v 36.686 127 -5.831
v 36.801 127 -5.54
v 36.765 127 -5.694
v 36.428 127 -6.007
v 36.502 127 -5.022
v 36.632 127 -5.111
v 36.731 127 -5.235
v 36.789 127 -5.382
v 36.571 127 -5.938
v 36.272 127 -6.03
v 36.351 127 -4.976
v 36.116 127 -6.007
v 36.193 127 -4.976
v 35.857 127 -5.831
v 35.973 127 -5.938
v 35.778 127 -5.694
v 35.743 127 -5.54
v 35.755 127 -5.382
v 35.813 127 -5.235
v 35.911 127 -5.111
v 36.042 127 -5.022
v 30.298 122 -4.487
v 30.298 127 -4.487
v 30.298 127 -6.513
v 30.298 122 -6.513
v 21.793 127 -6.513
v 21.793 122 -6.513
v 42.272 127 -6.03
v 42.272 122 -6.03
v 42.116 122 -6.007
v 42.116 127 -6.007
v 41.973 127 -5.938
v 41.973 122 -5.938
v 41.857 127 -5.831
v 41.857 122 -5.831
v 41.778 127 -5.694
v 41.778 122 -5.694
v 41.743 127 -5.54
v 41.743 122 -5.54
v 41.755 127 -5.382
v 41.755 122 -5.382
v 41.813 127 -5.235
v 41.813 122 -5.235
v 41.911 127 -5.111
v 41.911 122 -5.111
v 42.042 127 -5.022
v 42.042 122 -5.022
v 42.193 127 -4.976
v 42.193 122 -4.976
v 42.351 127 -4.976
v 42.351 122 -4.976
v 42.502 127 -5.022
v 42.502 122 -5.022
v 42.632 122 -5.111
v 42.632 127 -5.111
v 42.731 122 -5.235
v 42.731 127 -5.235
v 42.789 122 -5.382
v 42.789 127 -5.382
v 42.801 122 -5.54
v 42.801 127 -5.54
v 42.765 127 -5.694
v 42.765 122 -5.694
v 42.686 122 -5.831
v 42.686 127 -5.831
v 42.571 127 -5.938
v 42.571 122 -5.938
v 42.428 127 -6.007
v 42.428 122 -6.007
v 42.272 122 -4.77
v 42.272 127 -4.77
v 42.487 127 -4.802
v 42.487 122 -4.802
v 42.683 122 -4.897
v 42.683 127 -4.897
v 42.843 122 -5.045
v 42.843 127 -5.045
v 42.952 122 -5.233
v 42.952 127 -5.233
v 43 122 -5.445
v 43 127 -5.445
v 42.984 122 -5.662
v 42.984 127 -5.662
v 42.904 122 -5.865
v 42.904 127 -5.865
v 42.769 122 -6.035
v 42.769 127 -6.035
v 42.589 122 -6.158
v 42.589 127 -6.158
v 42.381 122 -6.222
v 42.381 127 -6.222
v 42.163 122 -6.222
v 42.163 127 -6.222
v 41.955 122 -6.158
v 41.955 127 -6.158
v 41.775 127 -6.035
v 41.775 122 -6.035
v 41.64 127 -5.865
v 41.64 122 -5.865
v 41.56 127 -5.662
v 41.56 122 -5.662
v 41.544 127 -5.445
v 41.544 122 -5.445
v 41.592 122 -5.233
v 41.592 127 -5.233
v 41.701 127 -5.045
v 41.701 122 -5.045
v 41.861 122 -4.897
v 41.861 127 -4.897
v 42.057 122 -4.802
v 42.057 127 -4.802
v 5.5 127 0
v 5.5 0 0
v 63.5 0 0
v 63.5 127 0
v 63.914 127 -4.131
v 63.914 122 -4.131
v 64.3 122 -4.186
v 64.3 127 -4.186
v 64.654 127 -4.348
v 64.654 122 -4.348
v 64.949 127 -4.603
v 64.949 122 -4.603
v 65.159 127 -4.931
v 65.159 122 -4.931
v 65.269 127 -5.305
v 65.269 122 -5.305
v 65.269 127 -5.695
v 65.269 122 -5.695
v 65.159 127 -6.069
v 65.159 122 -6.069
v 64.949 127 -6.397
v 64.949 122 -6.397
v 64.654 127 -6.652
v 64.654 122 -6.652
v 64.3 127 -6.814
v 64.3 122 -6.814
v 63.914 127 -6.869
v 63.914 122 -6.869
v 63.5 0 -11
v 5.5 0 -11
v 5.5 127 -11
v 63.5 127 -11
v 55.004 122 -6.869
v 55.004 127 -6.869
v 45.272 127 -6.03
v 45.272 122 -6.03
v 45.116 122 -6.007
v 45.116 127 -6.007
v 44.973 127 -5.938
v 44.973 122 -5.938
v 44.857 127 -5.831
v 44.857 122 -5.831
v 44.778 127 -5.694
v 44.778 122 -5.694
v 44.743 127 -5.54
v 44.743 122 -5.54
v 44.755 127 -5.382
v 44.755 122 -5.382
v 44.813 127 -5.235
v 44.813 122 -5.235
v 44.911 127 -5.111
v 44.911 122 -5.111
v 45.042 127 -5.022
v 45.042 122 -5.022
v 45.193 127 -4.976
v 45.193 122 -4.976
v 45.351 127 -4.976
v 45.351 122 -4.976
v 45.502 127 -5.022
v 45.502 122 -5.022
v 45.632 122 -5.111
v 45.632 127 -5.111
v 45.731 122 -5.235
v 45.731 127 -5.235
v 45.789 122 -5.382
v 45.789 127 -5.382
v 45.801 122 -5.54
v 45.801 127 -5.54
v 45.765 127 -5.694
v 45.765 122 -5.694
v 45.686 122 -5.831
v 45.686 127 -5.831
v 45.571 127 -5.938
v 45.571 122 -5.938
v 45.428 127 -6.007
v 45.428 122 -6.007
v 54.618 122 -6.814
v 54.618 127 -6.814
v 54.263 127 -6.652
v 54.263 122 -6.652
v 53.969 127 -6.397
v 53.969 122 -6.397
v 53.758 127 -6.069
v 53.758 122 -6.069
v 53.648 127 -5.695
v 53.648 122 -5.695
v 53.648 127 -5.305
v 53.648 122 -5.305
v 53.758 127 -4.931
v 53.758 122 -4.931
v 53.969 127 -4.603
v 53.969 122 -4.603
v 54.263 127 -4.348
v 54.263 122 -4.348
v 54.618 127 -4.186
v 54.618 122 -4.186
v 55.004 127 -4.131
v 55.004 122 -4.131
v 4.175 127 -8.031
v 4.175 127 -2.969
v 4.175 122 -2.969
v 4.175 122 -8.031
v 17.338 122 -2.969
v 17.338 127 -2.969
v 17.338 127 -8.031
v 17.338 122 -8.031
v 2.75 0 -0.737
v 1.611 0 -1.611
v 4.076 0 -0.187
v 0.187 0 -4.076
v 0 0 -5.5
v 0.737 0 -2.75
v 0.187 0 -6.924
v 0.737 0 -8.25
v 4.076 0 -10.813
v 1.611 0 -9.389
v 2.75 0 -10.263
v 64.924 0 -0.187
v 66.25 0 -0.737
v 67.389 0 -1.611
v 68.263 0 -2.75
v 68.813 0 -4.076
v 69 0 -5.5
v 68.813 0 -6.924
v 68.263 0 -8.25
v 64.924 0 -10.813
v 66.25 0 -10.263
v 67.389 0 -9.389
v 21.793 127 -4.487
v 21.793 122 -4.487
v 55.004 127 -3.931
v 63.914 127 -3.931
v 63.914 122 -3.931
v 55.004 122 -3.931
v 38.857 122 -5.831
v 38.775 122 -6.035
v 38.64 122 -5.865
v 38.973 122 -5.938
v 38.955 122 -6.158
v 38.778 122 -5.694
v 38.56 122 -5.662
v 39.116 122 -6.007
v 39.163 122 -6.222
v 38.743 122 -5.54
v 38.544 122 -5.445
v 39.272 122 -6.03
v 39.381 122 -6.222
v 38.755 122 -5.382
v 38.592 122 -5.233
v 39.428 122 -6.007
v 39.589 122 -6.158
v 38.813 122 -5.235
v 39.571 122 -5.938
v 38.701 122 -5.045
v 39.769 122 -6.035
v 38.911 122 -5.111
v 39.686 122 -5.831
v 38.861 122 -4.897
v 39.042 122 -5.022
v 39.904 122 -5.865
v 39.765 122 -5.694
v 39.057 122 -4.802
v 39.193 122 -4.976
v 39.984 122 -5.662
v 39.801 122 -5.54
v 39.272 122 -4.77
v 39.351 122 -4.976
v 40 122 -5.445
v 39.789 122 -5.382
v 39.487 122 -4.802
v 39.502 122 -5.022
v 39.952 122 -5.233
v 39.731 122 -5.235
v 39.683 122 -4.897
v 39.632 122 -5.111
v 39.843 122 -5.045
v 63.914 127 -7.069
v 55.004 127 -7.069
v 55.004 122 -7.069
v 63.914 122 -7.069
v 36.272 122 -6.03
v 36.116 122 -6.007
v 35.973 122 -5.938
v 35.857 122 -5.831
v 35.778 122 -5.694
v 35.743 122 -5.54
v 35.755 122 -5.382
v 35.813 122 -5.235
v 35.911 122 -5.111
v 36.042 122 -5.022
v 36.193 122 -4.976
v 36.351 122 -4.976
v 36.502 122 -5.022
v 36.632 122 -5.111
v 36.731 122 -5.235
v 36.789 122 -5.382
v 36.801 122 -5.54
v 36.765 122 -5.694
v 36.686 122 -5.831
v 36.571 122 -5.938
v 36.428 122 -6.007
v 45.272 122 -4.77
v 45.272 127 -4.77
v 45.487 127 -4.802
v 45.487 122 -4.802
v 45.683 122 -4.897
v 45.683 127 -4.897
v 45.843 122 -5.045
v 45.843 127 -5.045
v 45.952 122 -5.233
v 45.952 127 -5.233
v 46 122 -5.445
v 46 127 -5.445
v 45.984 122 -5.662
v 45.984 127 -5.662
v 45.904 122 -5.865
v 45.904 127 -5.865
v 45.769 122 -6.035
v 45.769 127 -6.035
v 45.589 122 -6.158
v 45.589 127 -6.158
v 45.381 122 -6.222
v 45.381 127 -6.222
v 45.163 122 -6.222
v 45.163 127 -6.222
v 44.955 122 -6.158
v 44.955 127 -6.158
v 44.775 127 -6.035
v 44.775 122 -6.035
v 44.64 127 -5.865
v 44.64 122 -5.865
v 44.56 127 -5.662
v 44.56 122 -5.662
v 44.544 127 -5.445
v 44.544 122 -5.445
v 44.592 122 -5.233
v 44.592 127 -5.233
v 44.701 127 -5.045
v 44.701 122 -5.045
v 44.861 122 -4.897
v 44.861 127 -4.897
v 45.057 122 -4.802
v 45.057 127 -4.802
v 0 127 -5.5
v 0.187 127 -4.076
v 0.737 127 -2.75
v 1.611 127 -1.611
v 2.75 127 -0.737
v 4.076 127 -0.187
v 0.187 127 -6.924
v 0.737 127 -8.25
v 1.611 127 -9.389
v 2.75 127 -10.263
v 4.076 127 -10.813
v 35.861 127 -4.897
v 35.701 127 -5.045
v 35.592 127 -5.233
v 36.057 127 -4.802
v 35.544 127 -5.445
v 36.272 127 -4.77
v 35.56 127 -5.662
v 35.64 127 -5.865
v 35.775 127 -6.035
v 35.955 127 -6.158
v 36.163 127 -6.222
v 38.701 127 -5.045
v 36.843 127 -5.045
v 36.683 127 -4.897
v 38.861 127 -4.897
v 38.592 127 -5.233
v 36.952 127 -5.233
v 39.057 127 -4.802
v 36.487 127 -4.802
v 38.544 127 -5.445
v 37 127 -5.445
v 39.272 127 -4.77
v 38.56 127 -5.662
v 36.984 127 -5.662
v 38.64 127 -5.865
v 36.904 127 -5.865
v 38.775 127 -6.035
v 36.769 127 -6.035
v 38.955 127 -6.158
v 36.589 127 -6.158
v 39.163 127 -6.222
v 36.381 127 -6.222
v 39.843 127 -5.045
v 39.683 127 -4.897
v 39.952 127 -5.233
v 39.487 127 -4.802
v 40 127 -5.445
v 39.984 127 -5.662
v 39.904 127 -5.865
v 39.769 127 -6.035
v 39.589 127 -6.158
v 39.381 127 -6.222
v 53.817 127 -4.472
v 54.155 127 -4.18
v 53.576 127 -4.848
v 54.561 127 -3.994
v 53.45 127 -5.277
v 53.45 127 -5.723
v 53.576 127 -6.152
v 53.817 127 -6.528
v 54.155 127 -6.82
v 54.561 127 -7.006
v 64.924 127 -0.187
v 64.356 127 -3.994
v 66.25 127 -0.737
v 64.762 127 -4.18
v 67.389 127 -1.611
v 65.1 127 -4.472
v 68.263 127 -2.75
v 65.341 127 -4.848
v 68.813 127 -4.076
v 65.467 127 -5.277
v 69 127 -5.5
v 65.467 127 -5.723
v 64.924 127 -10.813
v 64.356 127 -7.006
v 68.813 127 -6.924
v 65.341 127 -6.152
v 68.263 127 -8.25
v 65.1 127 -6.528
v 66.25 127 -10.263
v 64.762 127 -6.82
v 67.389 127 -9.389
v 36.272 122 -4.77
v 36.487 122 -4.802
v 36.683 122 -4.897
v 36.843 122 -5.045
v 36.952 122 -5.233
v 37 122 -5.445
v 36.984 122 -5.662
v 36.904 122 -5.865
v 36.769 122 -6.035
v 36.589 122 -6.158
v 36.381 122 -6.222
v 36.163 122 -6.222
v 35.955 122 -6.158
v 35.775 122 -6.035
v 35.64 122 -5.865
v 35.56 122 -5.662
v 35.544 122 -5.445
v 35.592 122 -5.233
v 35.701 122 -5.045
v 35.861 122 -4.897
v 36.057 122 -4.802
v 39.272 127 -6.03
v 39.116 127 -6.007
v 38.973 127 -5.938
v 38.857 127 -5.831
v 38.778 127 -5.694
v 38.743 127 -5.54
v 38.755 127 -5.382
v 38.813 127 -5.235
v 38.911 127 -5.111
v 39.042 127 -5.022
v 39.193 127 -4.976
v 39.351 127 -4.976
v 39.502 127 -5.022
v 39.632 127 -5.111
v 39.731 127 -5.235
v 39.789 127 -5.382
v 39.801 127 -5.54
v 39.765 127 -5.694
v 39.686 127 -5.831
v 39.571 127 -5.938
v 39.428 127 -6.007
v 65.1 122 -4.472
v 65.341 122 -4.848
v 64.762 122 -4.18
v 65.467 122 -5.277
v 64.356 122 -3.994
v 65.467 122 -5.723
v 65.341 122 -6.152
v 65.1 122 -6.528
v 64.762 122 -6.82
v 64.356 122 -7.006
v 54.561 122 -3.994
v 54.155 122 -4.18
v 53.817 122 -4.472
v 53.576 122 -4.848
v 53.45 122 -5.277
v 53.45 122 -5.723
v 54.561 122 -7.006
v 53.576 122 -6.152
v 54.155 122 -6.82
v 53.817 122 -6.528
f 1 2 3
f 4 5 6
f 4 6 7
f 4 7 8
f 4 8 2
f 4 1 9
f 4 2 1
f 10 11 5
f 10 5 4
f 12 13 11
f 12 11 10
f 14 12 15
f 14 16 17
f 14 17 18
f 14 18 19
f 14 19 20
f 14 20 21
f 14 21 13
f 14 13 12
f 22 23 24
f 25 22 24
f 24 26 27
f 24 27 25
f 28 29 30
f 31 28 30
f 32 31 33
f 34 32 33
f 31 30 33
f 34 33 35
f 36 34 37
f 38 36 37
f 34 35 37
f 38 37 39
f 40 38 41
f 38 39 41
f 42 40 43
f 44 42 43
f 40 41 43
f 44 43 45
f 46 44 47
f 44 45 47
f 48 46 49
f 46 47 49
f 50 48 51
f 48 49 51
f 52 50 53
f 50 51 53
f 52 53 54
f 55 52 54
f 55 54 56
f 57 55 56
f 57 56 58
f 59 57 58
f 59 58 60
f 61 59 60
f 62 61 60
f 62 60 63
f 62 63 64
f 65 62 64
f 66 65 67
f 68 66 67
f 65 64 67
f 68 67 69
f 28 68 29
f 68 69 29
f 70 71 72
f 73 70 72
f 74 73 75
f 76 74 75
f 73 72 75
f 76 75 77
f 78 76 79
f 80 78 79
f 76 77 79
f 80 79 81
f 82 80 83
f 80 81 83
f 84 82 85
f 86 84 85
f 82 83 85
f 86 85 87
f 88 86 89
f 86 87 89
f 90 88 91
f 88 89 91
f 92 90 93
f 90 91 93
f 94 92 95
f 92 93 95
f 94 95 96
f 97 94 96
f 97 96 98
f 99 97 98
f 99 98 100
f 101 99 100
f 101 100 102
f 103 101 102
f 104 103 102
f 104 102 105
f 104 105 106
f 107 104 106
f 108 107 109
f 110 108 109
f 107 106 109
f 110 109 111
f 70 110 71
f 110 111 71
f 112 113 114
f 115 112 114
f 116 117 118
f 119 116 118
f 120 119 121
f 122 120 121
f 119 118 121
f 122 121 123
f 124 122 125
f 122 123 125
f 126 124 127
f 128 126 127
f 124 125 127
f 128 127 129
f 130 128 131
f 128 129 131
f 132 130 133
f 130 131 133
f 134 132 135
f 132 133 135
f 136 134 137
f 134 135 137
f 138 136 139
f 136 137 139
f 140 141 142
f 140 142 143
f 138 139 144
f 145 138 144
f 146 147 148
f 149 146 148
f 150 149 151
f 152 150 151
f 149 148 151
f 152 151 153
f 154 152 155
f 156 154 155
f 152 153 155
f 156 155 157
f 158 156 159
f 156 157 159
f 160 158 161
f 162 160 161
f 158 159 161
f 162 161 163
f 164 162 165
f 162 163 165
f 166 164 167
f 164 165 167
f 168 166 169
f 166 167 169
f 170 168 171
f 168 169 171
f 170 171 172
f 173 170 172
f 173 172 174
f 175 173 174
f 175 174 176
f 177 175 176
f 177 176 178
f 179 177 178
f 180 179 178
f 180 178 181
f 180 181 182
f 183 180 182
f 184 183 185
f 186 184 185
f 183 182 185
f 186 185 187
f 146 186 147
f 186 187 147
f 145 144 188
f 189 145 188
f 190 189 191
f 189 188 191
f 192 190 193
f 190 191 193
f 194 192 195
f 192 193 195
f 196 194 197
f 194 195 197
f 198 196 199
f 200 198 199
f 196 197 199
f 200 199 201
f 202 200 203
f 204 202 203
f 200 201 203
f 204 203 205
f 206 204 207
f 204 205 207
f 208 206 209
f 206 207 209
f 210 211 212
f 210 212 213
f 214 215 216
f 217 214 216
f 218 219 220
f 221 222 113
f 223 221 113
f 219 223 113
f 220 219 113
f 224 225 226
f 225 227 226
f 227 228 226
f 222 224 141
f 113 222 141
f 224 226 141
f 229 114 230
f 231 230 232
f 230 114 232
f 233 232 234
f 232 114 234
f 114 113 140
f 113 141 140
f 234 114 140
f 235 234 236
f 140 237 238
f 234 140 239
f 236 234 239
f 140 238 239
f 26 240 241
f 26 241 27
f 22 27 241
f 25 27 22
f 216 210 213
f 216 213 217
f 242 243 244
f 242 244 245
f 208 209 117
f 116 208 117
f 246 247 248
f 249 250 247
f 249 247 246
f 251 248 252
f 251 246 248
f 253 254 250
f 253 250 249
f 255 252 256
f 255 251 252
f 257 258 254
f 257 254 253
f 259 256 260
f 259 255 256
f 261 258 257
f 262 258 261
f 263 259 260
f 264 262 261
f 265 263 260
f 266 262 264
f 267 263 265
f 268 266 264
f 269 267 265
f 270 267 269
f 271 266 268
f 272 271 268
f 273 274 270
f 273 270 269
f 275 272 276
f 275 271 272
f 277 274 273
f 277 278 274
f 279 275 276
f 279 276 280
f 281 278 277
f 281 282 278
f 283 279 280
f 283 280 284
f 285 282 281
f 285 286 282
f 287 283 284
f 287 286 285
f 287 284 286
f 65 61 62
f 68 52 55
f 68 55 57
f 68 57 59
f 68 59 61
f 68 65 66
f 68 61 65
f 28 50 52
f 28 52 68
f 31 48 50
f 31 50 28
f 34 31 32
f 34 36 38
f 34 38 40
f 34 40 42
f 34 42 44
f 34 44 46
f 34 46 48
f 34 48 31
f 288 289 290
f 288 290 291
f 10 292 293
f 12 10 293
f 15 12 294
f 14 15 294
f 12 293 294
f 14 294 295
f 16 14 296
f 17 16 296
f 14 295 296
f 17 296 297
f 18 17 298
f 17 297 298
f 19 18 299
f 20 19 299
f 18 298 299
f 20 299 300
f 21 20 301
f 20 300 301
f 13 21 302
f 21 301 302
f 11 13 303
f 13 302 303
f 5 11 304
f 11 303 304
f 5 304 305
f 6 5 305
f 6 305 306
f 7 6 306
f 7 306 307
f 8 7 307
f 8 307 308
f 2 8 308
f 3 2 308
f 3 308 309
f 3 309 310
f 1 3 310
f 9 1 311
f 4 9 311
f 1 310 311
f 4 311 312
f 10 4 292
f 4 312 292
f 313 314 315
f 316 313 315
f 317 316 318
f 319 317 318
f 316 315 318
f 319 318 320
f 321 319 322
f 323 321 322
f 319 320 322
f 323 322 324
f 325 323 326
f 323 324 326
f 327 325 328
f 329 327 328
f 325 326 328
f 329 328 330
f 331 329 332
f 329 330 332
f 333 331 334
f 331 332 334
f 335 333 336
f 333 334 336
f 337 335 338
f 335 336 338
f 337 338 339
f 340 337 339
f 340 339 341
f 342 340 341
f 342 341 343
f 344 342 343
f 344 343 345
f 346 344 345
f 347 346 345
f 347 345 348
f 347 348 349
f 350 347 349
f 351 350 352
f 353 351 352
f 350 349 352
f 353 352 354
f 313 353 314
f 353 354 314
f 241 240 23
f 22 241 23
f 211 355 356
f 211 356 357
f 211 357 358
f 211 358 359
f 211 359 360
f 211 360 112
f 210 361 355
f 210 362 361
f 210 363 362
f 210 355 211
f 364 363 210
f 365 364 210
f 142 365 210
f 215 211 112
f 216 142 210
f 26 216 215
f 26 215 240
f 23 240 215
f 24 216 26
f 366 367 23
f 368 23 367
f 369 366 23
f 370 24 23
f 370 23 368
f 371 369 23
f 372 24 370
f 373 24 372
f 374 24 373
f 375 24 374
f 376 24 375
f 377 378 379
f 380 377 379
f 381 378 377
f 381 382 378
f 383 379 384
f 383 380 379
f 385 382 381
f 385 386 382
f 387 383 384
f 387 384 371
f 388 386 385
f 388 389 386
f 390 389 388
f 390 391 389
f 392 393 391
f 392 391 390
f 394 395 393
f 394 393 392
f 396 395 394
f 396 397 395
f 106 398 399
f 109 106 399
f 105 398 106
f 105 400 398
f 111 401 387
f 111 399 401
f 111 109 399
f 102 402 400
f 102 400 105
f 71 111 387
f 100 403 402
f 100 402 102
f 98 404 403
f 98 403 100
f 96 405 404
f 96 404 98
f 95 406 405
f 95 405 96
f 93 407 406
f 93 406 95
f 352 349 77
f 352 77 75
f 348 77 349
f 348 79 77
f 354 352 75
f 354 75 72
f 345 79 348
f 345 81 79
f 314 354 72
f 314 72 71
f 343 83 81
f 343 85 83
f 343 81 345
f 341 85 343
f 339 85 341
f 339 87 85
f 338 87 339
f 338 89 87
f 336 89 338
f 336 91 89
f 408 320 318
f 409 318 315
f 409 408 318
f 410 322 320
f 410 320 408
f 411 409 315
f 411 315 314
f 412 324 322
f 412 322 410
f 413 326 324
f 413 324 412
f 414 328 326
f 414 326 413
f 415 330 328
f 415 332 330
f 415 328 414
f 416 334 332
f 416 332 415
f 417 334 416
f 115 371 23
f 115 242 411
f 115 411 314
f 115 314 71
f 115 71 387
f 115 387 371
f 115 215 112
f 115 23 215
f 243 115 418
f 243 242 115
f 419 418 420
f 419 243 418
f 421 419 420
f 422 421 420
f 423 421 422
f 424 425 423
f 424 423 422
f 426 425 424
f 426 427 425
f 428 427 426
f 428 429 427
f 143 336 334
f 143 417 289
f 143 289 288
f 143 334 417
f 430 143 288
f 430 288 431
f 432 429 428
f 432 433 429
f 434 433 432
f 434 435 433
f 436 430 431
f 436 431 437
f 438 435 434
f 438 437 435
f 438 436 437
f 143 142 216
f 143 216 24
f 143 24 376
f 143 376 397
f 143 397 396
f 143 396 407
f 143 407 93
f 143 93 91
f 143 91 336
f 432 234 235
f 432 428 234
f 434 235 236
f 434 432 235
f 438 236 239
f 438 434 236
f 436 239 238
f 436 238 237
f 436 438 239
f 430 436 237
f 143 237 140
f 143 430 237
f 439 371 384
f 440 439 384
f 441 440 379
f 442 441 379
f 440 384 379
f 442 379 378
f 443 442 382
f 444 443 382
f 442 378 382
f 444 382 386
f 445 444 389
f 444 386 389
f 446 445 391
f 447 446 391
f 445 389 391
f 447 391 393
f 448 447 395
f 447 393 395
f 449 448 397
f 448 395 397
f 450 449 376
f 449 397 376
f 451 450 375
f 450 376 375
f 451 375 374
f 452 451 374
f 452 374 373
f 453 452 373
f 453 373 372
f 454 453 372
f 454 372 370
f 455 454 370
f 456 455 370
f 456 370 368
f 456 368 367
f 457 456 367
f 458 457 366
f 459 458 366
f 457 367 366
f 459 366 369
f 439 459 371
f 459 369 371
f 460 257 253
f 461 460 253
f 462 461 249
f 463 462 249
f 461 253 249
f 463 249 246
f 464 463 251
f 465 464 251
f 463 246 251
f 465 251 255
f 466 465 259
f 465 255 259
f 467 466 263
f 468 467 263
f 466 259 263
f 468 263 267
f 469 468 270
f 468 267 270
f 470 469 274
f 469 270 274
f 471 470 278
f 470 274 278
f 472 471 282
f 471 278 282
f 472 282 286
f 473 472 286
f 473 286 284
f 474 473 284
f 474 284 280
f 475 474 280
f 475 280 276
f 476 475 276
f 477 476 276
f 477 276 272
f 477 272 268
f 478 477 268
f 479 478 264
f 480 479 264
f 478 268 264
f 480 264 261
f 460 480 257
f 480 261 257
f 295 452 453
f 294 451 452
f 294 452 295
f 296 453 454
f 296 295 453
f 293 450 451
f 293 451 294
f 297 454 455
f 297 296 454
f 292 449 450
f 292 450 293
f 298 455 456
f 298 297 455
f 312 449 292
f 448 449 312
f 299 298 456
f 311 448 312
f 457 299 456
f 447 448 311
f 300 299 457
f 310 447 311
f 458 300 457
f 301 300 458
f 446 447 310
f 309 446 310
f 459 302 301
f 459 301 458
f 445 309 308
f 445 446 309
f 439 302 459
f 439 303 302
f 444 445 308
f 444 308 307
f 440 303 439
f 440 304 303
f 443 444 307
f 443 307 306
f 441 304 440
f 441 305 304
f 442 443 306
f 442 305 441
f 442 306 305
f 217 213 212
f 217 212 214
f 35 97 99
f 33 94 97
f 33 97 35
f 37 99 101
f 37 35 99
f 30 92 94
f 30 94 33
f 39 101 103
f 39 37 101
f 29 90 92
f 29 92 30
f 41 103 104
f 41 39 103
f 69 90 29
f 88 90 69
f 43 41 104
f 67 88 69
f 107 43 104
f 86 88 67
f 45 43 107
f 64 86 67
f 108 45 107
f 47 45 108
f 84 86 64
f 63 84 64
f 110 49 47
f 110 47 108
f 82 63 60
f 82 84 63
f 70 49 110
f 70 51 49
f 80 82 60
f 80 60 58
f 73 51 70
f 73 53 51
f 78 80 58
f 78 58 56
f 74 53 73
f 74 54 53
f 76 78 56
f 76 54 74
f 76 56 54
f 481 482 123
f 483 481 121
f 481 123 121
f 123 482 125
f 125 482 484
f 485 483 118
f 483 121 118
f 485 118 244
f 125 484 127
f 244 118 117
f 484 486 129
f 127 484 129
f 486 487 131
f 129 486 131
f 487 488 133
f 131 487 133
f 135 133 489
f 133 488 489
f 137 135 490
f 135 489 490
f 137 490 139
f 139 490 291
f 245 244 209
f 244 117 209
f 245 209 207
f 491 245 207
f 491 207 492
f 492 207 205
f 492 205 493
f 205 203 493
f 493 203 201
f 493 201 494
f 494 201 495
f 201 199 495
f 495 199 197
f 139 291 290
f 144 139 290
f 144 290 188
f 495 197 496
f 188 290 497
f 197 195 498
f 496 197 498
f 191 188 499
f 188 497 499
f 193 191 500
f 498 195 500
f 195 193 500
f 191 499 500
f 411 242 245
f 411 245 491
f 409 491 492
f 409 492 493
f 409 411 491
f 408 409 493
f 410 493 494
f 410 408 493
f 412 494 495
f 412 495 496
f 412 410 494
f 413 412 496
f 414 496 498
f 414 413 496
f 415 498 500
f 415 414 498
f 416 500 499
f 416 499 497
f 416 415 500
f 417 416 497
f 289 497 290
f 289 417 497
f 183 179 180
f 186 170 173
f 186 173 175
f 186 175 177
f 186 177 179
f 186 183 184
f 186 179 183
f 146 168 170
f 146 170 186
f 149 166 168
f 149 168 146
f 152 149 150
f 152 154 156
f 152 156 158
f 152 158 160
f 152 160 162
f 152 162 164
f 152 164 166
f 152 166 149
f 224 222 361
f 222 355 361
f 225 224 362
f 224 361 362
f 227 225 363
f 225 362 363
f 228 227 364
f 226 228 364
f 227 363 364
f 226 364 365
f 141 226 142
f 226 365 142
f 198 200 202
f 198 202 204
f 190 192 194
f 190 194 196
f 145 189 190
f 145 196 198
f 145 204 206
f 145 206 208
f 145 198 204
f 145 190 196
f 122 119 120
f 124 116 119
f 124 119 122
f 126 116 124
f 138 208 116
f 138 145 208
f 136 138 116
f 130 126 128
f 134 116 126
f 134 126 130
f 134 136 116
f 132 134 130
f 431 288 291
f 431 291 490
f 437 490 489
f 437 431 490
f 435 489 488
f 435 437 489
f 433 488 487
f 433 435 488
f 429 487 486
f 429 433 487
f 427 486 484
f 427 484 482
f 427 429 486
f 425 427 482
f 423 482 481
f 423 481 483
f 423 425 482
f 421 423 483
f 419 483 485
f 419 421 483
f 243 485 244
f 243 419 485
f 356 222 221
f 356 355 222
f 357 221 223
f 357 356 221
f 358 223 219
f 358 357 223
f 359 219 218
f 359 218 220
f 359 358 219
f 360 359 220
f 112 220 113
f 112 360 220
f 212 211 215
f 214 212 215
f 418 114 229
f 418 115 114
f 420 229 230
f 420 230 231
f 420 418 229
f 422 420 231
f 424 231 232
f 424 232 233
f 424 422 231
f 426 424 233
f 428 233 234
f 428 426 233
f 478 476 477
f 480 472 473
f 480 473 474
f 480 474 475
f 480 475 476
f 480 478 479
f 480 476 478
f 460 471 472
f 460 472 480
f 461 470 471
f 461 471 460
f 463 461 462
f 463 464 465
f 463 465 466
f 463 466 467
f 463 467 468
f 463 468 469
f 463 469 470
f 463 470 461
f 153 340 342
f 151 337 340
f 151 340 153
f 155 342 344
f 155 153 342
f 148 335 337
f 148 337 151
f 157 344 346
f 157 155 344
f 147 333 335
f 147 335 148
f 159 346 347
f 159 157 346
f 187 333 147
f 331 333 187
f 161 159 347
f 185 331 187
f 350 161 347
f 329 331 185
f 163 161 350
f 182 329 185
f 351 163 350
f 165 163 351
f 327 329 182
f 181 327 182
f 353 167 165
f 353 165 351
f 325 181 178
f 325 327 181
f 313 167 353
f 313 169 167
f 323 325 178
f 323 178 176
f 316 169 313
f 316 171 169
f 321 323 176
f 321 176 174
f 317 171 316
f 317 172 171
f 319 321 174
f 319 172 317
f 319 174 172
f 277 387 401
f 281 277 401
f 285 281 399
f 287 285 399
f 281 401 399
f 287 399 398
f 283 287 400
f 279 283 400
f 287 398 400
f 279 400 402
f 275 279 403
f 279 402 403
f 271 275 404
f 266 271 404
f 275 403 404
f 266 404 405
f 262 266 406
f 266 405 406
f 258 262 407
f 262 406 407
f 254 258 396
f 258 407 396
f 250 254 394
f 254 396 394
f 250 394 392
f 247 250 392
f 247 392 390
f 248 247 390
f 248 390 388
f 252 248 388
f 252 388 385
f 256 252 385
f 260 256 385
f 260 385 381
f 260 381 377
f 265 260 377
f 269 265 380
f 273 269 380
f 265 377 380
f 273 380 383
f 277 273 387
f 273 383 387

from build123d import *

# Parameters (mm, degrees)
SKETCH1_W           = 69
SKETCH1_H           = 11
BOSS_EXTRUDE1_DEPTH = 127
FILLET1_R           = 5.5
SKETCH2_R           = 0.730138729
SKETCH2_W           = 13.16276312
SKETCH2_H           = 5.0626012
SKETCH2_W_2         = 8.505170017
SKETCH2_H_2         = 2.02504048
CUT_EXTRUDE1_DEPTH  = 5
SKETCH3_R           = 0.530138729
BOSS_EXTRUDE2_DEPTH = 5


with BuildPart() as part:
    # Sketch1 → Boss-Extrude1 (new body)
    with BuildSketch(Plane(origin=(0, 0, 0), x_dir=(1, 0, 0), z_dir=(0, 1, 0))):
        with Locations((34.5, 5.5)):
            Rectangle(SKETCH1_W, SKETCH1_H)
    extrude(amount=BOSS_EXTRUDE1_DEPTH)

    # Fillet1
    fillet1_edges = [part.edges().sort_by_distance(p)[0] for p in [
        (69, 63.5, 0),
        (69, 63.5, -11),
        (0, 63.5, -11),
        (0, 63.5, 0),
    ]]
    fillet(fillet1_edges, radius=FILLET1_R - 0.0001)  # a hair under: the kernel refuses the full size

    # Sketch2 → Cut-Extrude1 (cut)
    with BuildSketch(Plane(origin=(0, 127, 0), x_dir=(1, 0, 0), z_dir=(0, 1, 0))):
        with Locations(Location((36.27191042, 5.5, 0), (0, 0, 270))):
            Circle(SKETCH2_R)
        with Locations(Location((39.27191042, 5.5, 0), (0, 0, 270))):
            Circle(SKETCH2_R)
        with Locations(Location((42.27191042, 5.5, 0), (0, 0, 270))):
            Circle(SKETCH2_R)
        with Locations(Location((45.27191042, 5.5, 0), (0, 0, 270))):
            Circle(SKETCH2_R)
        with Locations((10.756400371, 5.5)):
            Rectangle(SKETCH2_W, SKETCH2_H)
        with Locations((26.045455995, 5.5)):
            Rectangle(SKETCH2_W_2, SKETCH2_H_2)
        with BuildLine():
            Line((55.003534861, 7.069406372), (63.913712973, 7.069406372))
            ThreePointArc((63.913712973, 7.069406372), (65.483119345, 5.5), (63.913712973, 3.930593628))
            Line((63.913712973, 3.930593628), (55.003534861, 3.930593628))
            ThreePointArc((55.003534861, 3.930593628), (53.434128489, 5.5), (55.003534861, 7.069406372))
        make_face()
    extrude(amount=-CUT_EXTRUDE1_DEPTH, mode=Mode.SUBTRACT)

    # Sketch3 → Boss-Extrude2 (add)
    with BuildSketch(Plane(origin=(0, 122, 0), x_dir=(1, 0, 0), z_dir=(0, 1, 0))):
        with Locations(Location((36.27191042, 5.5, 0), (0, 0, 90))):
            Circle(SKETCH3_R)
        with Locations(Location((39.27191042, 5.5, 0), (0, 0, 90))):
            Circle(SKETCH3_R)
        with Locations(Location((42.27191042, 5.5, 0), (0, 0, 90))):
            Circle(SKETCH3_R)
        with Locations(Location((45.27191042, 5.5, 0), (0, 0, 90))):
            Circle(SKETCH3_R)
        with BuildLine():
            Line((55.003534861, 4.130593628), (63.913712973, 4.130593628))
            ThreePointArc((63.913712973, 4.130593628), (65.283119345, 5.5), (63.913712973, 6.869406372))
            Line((63.913712973, 6.869406372), (55.003534861, 6.869406372))
            ThreePointArc((55.003534861, 6.869406372), (53.634128489, 5.5), (55.003534861, 4.130593628))
        make_face()
    extrude(amount=BOSS_EXTRUDE2_DEPTH)


solid = part.part
